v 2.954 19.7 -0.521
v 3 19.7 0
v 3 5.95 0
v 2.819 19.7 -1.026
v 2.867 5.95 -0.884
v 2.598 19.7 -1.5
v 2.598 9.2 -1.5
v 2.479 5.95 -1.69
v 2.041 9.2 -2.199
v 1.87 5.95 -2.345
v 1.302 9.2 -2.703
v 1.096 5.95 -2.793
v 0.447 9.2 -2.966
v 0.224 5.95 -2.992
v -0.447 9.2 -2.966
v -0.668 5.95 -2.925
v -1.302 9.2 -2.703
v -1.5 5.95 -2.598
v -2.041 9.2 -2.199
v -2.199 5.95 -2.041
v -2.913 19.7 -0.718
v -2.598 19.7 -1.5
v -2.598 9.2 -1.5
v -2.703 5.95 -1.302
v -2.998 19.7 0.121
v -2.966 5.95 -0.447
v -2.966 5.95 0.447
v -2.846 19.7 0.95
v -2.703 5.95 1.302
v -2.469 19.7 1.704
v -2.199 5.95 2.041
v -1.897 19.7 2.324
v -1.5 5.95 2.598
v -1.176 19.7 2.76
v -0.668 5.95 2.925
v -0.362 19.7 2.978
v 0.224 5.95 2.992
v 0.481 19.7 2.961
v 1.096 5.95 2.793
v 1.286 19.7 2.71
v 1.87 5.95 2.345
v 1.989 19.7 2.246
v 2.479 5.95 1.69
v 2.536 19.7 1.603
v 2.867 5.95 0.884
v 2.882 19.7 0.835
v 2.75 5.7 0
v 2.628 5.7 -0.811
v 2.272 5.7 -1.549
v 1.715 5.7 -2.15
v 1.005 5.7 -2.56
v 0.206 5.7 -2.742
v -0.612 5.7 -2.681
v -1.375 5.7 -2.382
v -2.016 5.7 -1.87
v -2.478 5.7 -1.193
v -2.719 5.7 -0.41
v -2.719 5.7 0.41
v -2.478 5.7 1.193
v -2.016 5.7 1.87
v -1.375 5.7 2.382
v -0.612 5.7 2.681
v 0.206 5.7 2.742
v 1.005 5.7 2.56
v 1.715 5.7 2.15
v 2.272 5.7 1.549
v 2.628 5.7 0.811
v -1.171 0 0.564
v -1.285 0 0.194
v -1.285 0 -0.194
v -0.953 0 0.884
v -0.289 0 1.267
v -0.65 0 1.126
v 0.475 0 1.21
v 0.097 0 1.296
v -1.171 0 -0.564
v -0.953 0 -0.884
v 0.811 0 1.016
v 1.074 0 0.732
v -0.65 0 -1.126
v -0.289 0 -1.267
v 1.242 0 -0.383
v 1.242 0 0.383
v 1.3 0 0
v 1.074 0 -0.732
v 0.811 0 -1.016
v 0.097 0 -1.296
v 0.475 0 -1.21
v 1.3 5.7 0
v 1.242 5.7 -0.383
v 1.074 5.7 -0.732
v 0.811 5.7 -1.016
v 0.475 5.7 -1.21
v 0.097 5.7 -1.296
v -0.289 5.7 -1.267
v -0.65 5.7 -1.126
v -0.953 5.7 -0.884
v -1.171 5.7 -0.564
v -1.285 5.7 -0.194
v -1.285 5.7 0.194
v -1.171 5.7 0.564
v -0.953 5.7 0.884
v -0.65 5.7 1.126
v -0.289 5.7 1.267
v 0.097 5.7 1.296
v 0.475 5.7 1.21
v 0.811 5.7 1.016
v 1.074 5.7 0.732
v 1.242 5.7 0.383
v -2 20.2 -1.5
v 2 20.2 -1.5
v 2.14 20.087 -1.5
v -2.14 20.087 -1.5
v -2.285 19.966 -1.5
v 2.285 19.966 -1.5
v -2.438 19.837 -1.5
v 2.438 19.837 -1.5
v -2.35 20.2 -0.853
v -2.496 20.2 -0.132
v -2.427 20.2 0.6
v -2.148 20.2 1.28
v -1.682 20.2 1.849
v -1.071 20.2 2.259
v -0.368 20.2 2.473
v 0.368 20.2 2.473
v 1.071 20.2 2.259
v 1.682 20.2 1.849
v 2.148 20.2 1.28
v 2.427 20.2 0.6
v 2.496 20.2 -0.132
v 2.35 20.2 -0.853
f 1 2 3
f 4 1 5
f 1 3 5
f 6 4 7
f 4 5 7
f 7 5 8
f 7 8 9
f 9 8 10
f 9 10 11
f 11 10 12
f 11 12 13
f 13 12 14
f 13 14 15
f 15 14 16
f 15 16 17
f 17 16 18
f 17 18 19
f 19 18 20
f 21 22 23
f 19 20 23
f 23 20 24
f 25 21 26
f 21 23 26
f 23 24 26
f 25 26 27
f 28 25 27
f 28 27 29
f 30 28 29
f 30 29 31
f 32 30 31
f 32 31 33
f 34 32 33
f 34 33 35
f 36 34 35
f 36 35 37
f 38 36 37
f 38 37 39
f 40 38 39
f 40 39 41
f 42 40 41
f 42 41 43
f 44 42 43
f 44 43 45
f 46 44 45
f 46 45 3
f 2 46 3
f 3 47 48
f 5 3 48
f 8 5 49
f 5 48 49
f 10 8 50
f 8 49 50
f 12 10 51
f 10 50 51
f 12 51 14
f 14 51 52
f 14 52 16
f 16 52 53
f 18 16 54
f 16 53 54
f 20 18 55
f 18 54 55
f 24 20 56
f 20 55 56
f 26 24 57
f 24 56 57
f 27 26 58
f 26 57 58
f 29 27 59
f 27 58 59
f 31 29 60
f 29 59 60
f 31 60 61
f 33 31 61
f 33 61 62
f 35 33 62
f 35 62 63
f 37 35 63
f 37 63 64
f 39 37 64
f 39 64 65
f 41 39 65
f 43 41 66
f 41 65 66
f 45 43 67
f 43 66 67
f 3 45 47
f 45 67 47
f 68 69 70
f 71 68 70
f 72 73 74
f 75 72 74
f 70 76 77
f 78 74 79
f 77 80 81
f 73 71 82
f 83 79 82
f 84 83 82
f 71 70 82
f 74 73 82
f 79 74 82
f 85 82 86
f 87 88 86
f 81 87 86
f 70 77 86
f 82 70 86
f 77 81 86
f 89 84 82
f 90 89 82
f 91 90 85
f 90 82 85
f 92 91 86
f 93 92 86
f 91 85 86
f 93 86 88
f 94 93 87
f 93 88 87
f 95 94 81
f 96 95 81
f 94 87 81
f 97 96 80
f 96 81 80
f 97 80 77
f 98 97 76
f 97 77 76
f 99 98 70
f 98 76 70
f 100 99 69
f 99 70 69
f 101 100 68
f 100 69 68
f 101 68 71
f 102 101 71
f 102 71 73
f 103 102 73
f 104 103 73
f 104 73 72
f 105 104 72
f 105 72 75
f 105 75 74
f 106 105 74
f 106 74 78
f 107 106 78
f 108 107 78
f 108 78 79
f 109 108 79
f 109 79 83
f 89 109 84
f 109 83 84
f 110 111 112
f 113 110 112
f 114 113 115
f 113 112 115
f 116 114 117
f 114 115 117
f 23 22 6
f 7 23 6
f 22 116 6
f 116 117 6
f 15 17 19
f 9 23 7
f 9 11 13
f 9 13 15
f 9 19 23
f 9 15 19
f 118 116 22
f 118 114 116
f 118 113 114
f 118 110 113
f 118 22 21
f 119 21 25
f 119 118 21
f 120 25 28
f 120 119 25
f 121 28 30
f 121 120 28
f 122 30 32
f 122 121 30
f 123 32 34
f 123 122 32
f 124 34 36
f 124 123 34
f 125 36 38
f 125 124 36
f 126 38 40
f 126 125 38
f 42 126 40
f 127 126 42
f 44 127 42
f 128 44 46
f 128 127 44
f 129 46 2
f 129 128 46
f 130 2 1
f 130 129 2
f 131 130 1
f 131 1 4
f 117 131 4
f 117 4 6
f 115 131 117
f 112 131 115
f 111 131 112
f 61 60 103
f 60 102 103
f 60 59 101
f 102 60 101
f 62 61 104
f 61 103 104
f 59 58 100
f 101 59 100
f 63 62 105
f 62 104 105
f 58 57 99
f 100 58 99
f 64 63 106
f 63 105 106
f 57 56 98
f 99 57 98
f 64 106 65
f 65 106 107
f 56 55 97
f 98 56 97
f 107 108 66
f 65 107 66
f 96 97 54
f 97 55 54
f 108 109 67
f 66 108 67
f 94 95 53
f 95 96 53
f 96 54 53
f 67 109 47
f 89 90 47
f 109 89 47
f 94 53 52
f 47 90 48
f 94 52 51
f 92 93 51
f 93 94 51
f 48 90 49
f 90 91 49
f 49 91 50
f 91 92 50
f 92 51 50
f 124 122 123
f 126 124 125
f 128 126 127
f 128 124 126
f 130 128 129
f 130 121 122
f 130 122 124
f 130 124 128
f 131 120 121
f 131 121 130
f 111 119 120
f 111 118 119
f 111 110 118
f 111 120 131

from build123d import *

# Parameters (mm, degrees)
SKETCH_1_R          = 1.3
EXTRUDE_1_DEPTH     = 5.7
SKETCH_2_R          = 3
EXTRUDE_2_DEPTH     = 14.5
CHAMFER_1_SIZE      = 0.25
CUT_EXTRUDE_1_DEPTH = 11
CHAMFER_2_SIZE      = 0.5


with BuildPart() as part:
    # 草图1 → 凸台-拉伸1 (new body)
    with BuildSketch(Plane(origin=(0, 0, 0), x_dir=(1, 0, 0), z_dir=(0, 1, 0))):
        Circle(SKETCH_1_R)
    extrude(amount=EXTRUDE_1_DEPTH)

    # 草图2 → 凸台-拉伸2 (add)
    with BuildSketch(Plane(origin=(0, 5.7, 0), x_dir=(1, 0, 0), z_dir=(0, 1, 0))):
        Circle(SKETCH_2_R)
    extrude(amount=EXTRUDE_2_DEPTH)

    # 倒角1
    chamfer_1_edges = [part.edges().sort_by_distance(p)[0] for p in [
        (-3, 5.7, 0),
    ]]
    chamfer(chamfer_1_edges, length=CHAMFER_1_SIZE)

    # 草图3 → 切除-拉伸1 (cut)
    with BuildSketch(Plane(origin=(0, 20.2, 0), x_dir=(1, 0, 0), z_dir=(0, 1, 0))):
        with BuildLine():
            Line((-2.598076211, 1.5), (2.598076211, 1.5))
            ThreePointArc((2.598076211, 1.5), (0, 3), (-2.598076211, 1.5))
        make_face()
    extrude(amount=-CUT_EXTRUDE_1_DEPTH, mode=Mode.SUBTRACT)

    # 倒角2
    chamfer_2_edges = [part.edges().sort_by_distance(p)[0] for p in [
        (-0.776457135, 20.2, 2.897777479),
    ]]
    chamfer(chamfer_2_edges, length=CHAMFER_2_SIZE)


solid = part.part
